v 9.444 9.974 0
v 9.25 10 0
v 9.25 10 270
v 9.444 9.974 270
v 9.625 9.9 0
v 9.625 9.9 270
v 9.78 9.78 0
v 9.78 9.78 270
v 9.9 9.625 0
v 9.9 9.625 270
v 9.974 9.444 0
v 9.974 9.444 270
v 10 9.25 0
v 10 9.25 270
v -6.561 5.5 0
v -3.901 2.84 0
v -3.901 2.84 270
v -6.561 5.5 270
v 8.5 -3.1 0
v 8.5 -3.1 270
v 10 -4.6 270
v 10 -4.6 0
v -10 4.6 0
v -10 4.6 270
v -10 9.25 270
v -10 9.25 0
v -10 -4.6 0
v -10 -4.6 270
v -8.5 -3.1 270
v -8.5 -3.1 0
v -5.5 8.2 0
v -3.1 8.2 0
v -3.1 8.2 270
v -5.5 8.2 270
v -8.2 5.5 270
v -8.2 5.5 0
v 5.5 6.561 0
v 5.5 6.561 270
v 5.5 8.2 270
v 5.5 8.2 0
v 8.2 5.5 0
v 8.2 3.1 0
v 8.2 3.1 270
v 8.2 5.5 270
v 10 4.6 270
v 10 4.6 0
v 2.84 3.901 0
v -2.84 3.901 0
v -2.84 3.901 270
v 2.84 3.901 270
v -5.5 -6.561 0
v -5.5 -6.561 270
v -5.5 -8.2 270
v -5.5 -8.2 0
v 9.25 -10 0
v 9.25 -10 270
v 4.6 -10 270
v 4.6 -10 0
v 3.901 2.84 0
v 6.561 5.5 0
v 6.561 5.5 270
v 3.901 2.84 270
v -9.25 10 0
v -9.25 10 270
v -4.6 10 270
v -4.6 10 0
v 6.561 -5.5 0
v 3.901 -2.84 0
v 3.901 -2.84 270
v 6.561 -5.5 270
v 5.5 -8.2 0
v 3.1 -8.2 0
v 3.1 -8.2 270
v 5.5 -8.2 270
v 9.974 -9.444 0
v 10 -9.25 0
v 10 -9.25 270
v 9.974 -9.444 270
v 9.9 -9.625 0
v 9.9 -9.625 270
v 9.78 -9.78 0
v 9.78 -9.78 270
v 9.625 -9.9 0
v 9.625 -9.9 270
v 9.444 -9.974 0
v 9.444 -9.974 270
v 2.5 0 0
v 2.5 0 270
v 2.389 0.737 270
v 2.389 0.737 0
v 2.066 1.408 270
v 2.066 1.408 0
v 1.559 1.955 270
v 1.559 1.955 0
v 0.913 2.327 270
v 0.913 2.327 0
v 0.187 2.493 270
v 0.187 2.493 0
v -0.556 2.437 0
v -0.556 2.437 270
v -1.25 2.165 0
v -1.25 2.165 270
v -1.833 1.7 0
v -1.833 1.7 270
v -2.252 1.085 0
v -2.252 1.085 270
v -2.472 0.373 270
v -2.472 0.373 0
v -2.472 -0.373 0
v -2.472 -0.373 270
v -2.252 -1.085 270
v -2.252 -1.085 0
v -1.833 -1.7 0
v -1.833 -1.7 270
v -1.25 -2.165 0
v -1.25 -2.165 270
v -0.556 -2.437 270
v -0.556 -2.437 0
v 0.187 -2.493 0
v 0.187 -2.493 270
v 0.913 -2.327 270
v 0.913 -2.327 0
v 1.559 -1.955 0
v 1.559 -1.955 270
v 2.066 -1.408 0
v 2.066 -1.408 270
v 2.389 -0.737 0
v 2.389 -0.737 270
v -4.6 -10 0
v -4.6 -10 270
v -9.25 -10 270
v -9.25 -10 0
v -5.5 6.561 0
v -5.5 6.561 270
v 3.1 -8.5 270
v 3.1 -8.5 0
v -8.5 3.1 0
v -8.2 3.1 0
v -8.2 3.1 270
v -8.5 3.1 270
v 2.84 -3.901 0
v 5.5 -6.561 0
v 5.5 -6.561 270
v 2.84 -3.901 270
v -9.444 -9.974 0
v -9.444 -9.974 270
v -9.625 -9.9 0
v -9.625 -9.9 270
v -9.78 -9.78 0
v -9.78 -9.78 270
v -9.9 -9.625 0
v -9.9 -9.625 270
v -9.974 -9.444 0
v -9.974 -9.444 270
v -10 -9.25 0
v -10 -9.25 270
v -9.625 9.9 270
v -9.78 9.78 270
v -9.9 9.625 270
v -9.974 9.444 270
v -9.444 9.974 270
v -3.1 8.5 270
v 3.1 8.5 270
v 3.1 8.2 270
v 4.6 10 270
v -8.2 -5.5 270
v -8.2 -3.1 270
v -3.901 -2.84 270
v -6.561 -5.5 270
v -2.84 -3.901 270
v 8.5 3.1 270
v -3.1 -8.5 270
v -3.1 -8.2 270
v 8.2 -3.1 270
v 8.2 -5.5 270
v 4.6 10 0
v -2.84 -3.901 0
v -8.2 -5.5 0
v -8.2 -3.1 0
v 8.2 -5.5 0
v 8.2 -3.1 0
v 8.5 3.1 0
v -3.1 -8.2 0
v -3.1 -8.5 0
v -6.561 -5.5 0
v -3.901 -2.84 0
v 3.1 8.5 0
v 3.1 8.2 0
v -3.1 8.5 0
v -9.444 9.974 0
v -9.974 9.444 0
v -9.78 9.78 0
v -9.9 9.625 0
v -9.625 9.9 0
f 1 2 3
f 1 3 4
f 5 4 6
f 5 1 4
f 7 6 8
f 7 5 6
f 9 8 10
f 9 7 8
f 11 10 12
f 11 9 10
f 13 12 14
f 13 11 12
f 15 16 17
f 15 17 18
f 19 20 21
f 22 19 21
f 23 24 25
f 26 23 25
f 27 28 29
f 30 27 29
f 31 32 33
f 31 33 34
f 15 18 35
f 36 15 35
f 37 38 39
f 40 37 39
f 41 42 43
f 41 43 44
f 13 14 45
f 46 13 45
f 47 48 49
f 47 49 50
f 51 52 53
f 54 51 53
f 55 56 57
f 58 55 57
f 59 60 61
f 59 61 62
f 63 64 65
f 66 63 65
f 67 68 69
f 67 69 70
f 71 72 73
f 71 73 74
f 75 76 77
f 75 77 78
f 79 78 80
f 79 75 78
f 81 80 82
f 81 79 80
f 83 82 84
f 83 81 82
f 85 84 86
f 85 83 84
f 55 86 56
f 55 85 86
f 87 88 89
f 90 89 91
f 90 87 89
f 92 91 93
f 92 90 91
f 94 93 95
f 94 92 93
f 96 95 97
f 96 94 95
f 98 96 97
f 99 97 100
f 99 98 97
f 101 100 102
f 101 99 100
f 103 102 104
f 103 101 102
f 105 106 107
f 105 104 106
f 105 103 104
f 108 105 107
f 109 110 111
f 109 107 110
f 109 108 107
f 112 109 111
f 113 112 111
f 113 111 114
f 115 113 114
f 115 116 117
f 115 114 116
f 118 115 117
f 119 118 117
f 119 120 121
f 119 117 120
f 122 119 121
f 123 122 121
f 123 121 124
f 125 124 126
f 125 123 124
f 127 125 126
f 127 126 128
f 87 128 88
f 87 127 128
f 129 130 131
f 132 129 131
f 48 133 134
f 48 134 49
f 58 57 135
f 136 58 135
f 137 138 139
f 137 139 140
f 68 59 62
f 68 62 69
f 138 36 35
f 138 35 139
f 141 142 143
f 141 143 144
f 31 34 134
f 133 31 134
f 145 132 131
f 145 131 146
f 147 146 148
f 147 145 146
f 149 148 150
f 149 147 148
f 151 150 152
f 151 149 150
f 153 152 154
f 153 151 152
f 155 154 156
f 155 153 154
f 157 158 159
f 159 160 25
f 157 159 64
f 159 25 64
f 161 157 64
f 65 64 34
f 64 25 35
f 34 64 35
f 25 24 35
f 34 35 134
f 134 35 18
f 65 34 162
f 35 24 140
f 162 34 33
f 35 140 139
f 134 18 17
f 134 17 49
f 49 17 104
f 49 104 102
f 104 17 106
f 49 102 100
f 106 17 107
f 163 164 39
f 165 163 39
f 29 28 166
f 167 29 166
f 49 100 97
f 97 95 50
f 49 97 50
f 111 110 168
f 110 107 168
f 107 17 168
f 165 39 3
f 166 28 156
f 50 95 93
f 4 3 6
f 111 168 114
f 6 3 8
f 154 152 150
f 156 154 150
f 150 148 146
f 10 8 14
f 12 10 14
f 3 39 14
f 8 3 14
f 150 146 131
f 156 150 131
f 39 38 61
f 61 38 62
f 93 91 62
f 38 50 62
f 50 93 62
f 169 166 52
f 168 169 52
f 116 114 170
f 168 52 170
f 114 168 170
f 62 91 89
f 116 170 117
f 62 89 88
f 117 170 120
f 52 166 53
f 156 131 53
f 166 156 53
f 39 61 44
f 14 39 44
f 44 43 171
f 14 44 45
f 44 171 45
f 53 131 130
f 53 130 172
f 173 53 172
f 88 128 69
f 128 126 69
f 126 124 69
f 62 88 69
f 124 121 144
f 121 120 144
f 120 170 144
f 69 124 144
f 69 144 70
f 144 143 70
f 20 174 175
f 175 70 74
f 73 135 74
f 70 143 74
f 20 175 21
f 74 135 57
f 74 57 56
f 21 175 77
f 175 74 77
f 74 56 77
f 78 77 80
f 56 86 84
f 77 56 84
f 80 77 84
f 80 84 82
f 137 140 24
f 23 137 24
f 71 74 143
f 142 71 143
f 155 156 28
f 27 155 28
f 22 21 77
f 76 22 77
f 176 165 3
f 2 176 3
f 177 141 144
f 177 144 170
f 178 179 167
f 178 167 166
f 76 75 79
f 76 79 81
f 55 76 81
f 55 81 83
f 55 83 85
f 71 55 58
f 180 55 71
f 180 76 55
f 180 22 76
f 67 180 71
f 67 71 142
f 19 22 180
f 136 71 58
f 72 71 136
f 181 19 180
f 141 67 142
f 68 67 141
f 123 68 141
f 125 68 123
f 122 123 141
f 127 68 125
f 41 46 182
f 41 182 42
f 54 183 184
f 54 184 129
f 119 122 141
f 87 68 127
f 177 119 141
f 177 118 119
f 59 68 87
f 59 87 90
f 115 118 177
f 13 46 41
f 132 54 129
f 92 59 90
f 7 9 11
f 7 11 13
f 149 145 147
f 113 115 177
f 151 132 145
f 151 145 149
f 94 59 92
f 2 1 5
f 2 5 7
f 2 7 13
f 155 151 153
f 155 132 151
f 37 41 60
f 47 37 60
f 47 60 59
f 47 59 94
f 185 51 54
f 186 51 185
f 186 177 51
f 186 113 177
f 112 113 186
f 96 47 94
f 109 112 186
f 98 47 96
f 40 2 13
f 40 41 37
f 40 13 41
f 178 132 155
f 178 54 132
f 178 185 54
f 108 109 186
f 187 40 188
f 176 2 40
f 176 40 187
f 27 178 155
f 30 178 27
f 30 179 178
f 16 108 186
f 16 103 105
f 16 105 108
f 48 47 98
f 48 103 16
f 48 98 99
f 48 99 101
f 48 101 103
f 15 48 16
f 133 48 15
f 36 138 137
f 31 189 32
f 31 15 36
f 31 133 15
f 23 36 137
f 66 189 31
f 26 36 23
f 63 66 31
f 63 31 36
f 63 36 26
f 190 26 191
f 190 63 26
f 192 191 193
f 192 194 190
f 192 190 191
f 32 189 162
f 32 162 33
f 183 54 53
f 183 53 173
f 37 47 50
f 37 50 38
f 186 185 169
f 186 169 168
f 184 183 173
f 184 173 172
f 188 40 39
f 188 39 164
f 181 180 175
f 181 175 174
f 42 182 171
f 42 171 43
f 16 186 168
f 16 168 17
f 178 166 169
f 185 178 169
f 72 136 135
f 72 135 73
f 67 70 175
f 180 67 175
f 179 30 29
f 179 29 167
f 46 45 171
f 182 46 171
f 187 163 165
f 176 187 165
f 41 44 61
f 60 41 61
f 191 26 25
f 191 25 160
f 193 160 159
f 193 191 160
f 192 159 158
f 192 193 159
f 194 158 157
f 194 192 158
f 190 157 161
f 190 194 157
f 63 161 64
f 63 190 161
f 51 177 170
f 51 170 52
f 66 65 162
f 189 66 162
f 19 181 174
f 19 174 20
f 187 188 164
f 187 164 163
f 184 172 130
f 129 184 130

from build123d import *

# Parameters (mm, degrees)
CROQUIS1_R              = 2.5
SALIENTE_EXTRUIR1_DEPTH = 350
CUT_EXTRUDE1_DEPTH      = 47
CUT_EXTRUDE1_DEPTH_BACK = 40
SKETCH2_W               = 139.582587955
SKETCH2_H               = 242.432915921


with BuildPart() as part:
    # Croquis1 → Saliente-Extruir1 (new body)
    with BuildSketch(Plane.XY):
        with BuildLine():
            Line((-4.6, 10), (-3.1, 8.5))
            Line((-3.1, 8.5), (-3.1, 8.2))
            Line((-3.1, 8.2), (-5.5, 8.2))
            Line((-5.5, 8.2), (-5.5, 6.560660172))
            Line((-5.5, 6.560660172), (-2.84, 3.900660172))
            Line((-2.84, 3.900660172), (0, 3.900660172))
            Line((0, 3.900660172), (2.84, 3.900660172))
            Line((2.84, 3.900660172), (5.5, 6.560660172))
            Line((5.5, 6.560660172), (5.5, 8.2))
            Line((5.5, 8.2), (3.1, 8.2))
            Line((3.1, 8.2), (3.1, 8.5))
            Line((3.1, 8.5), (4.6, 10))
            Line((4.6, 10), (9.25, 10))
            ThreePointArc((9.25, 10), (9.780330086, 9.780330086), (10, 9.25))
            Line((10, 9.25), (10, 4.6))
            Line((10, 4.6), (8.5, 3.1))
            Line((8.5, 3.1), (8.2, 3.1))
            Line((8.2, 3.1), (8.2, 5.5))
            Line((8.2, 5.5), (6.560660172, 5.5))
            Line((6.560660172, 5.5), (3.900660172, 2.84))
            Line((3.900660172, 2.84), (3.900660172, 0))
            Line((3.900660172, 0), (3.900660172, -2.84))
            Line((3.900660172, -2.84), (6.560660172, -5.5))
            Line((6.560660172, -5.5), (8.2, -5.5))
            Line((8.2, -5.5), (8.2, -3.1))
            Line((8.2, -3.1), (8.5, -3.1))
            Line((8.5, -3.1), (10, -4.6))
            Line((10, -4.6), (10, -9.25))
            ThreePointArc((10, -9.25), (9.780330086, -9.780330086), (9.25, -10))
            Line((9.25, -10), (4.6, -10))
            Line((4.6, -10), (3.1, -8.5))
            Line((3.1, -8.5), (3.1, -8.2))
            Line((3.1, -8.2), (5.5, -8.2))
            Line((5.5, -8.2), (5.5, -6.560660172))
            Line((5.5, -6.560660172), (2.84, -3.900660172))
            Line((2.84, -3.900660172), (0, -3.900660172))
            Line((0, -3.900660172), (-2.84, -3.900660172))
            Line((-2.84, -3.900660172), (-5.5, -6.560660172))
            Line((-5.5, -6.560660172), (-5.5, -8.2))
            Line((-5.5, -8.2), (-3.1, -8.2))
            Line((-3.1, -8.2), (-3.1, -8.5))
            Line((-3.1, -8.5), (-4.6, -10))
            Line((-4.6, -10), (-9.25, -10))
            ThreePointArc((-9.25, -10), (-9.780330086, -9.780330086), (-10, -9.25))
            Line((-10, -9.25), (-10, -4.6))
            Line((-10, -4.6), (-8.5, -3.1))
            Line((-8.5, -3.1), (-8.2, -3.1))
            Line((-8.2, -3.1), (-8.2, -5.5))
            Line((-8.2, -5.5), (-6.560660172, -5.5))
            Line((-6.560660172, -5.5), (-3.900660172, -2.84))
            Line((-3.900660172, -2.84), (-3.900660172, 0))
            Line((-3.900660172, 0), (-3.900660172, 2.84))
            Line((-3.900660172, 2.84), (-6.560660172, 5.5))
            Line((-6.560660172, 5.5), (-8.2, 5.5))
            Line((-8.2, 5.5), (-8.2, 3.1))
            Line((-8.2, 3.1), (-8.5, 3.1))
            Line((-8.5, 3.1), (-10, 4.6))
            Line((-10, 4.6), (-10, 9.25))
            ThreePointArc((-10, 9.25), (-9.780330086, 9.780330086), (-9.25, 10))
            Line((-9.25, 10), (-4.6, 10))
        make_face()
        Circle(CROQUIS1_R, mode=Mode.SUBTRACT)
    extrude(amount=SALIENTE_EXTRUIR1_DEPTH)

    # Sketch2 → Cut-Extrude1 (cut, two sides: drawn at the far end of the back side and taken through both)
    with BuildSketch(Plane(origin=(0, 0, 0), x_dir=(1, 0, 0), z_dir=(0, 1, 0)).offset(-CUT_EXTRUDE1_DEPTH_BACK)):
        with Locations((12.355396541, -391.216457961)):
            Rectangle(SKETCH2_W, SKETCH2_H)
    extrude(amount=CUT_EXTRUDE1_DEPTH + CUT_EXTRUDE1_DEPTH_BACK, mode=Mode.SUBTRACT)


solid = part.part
